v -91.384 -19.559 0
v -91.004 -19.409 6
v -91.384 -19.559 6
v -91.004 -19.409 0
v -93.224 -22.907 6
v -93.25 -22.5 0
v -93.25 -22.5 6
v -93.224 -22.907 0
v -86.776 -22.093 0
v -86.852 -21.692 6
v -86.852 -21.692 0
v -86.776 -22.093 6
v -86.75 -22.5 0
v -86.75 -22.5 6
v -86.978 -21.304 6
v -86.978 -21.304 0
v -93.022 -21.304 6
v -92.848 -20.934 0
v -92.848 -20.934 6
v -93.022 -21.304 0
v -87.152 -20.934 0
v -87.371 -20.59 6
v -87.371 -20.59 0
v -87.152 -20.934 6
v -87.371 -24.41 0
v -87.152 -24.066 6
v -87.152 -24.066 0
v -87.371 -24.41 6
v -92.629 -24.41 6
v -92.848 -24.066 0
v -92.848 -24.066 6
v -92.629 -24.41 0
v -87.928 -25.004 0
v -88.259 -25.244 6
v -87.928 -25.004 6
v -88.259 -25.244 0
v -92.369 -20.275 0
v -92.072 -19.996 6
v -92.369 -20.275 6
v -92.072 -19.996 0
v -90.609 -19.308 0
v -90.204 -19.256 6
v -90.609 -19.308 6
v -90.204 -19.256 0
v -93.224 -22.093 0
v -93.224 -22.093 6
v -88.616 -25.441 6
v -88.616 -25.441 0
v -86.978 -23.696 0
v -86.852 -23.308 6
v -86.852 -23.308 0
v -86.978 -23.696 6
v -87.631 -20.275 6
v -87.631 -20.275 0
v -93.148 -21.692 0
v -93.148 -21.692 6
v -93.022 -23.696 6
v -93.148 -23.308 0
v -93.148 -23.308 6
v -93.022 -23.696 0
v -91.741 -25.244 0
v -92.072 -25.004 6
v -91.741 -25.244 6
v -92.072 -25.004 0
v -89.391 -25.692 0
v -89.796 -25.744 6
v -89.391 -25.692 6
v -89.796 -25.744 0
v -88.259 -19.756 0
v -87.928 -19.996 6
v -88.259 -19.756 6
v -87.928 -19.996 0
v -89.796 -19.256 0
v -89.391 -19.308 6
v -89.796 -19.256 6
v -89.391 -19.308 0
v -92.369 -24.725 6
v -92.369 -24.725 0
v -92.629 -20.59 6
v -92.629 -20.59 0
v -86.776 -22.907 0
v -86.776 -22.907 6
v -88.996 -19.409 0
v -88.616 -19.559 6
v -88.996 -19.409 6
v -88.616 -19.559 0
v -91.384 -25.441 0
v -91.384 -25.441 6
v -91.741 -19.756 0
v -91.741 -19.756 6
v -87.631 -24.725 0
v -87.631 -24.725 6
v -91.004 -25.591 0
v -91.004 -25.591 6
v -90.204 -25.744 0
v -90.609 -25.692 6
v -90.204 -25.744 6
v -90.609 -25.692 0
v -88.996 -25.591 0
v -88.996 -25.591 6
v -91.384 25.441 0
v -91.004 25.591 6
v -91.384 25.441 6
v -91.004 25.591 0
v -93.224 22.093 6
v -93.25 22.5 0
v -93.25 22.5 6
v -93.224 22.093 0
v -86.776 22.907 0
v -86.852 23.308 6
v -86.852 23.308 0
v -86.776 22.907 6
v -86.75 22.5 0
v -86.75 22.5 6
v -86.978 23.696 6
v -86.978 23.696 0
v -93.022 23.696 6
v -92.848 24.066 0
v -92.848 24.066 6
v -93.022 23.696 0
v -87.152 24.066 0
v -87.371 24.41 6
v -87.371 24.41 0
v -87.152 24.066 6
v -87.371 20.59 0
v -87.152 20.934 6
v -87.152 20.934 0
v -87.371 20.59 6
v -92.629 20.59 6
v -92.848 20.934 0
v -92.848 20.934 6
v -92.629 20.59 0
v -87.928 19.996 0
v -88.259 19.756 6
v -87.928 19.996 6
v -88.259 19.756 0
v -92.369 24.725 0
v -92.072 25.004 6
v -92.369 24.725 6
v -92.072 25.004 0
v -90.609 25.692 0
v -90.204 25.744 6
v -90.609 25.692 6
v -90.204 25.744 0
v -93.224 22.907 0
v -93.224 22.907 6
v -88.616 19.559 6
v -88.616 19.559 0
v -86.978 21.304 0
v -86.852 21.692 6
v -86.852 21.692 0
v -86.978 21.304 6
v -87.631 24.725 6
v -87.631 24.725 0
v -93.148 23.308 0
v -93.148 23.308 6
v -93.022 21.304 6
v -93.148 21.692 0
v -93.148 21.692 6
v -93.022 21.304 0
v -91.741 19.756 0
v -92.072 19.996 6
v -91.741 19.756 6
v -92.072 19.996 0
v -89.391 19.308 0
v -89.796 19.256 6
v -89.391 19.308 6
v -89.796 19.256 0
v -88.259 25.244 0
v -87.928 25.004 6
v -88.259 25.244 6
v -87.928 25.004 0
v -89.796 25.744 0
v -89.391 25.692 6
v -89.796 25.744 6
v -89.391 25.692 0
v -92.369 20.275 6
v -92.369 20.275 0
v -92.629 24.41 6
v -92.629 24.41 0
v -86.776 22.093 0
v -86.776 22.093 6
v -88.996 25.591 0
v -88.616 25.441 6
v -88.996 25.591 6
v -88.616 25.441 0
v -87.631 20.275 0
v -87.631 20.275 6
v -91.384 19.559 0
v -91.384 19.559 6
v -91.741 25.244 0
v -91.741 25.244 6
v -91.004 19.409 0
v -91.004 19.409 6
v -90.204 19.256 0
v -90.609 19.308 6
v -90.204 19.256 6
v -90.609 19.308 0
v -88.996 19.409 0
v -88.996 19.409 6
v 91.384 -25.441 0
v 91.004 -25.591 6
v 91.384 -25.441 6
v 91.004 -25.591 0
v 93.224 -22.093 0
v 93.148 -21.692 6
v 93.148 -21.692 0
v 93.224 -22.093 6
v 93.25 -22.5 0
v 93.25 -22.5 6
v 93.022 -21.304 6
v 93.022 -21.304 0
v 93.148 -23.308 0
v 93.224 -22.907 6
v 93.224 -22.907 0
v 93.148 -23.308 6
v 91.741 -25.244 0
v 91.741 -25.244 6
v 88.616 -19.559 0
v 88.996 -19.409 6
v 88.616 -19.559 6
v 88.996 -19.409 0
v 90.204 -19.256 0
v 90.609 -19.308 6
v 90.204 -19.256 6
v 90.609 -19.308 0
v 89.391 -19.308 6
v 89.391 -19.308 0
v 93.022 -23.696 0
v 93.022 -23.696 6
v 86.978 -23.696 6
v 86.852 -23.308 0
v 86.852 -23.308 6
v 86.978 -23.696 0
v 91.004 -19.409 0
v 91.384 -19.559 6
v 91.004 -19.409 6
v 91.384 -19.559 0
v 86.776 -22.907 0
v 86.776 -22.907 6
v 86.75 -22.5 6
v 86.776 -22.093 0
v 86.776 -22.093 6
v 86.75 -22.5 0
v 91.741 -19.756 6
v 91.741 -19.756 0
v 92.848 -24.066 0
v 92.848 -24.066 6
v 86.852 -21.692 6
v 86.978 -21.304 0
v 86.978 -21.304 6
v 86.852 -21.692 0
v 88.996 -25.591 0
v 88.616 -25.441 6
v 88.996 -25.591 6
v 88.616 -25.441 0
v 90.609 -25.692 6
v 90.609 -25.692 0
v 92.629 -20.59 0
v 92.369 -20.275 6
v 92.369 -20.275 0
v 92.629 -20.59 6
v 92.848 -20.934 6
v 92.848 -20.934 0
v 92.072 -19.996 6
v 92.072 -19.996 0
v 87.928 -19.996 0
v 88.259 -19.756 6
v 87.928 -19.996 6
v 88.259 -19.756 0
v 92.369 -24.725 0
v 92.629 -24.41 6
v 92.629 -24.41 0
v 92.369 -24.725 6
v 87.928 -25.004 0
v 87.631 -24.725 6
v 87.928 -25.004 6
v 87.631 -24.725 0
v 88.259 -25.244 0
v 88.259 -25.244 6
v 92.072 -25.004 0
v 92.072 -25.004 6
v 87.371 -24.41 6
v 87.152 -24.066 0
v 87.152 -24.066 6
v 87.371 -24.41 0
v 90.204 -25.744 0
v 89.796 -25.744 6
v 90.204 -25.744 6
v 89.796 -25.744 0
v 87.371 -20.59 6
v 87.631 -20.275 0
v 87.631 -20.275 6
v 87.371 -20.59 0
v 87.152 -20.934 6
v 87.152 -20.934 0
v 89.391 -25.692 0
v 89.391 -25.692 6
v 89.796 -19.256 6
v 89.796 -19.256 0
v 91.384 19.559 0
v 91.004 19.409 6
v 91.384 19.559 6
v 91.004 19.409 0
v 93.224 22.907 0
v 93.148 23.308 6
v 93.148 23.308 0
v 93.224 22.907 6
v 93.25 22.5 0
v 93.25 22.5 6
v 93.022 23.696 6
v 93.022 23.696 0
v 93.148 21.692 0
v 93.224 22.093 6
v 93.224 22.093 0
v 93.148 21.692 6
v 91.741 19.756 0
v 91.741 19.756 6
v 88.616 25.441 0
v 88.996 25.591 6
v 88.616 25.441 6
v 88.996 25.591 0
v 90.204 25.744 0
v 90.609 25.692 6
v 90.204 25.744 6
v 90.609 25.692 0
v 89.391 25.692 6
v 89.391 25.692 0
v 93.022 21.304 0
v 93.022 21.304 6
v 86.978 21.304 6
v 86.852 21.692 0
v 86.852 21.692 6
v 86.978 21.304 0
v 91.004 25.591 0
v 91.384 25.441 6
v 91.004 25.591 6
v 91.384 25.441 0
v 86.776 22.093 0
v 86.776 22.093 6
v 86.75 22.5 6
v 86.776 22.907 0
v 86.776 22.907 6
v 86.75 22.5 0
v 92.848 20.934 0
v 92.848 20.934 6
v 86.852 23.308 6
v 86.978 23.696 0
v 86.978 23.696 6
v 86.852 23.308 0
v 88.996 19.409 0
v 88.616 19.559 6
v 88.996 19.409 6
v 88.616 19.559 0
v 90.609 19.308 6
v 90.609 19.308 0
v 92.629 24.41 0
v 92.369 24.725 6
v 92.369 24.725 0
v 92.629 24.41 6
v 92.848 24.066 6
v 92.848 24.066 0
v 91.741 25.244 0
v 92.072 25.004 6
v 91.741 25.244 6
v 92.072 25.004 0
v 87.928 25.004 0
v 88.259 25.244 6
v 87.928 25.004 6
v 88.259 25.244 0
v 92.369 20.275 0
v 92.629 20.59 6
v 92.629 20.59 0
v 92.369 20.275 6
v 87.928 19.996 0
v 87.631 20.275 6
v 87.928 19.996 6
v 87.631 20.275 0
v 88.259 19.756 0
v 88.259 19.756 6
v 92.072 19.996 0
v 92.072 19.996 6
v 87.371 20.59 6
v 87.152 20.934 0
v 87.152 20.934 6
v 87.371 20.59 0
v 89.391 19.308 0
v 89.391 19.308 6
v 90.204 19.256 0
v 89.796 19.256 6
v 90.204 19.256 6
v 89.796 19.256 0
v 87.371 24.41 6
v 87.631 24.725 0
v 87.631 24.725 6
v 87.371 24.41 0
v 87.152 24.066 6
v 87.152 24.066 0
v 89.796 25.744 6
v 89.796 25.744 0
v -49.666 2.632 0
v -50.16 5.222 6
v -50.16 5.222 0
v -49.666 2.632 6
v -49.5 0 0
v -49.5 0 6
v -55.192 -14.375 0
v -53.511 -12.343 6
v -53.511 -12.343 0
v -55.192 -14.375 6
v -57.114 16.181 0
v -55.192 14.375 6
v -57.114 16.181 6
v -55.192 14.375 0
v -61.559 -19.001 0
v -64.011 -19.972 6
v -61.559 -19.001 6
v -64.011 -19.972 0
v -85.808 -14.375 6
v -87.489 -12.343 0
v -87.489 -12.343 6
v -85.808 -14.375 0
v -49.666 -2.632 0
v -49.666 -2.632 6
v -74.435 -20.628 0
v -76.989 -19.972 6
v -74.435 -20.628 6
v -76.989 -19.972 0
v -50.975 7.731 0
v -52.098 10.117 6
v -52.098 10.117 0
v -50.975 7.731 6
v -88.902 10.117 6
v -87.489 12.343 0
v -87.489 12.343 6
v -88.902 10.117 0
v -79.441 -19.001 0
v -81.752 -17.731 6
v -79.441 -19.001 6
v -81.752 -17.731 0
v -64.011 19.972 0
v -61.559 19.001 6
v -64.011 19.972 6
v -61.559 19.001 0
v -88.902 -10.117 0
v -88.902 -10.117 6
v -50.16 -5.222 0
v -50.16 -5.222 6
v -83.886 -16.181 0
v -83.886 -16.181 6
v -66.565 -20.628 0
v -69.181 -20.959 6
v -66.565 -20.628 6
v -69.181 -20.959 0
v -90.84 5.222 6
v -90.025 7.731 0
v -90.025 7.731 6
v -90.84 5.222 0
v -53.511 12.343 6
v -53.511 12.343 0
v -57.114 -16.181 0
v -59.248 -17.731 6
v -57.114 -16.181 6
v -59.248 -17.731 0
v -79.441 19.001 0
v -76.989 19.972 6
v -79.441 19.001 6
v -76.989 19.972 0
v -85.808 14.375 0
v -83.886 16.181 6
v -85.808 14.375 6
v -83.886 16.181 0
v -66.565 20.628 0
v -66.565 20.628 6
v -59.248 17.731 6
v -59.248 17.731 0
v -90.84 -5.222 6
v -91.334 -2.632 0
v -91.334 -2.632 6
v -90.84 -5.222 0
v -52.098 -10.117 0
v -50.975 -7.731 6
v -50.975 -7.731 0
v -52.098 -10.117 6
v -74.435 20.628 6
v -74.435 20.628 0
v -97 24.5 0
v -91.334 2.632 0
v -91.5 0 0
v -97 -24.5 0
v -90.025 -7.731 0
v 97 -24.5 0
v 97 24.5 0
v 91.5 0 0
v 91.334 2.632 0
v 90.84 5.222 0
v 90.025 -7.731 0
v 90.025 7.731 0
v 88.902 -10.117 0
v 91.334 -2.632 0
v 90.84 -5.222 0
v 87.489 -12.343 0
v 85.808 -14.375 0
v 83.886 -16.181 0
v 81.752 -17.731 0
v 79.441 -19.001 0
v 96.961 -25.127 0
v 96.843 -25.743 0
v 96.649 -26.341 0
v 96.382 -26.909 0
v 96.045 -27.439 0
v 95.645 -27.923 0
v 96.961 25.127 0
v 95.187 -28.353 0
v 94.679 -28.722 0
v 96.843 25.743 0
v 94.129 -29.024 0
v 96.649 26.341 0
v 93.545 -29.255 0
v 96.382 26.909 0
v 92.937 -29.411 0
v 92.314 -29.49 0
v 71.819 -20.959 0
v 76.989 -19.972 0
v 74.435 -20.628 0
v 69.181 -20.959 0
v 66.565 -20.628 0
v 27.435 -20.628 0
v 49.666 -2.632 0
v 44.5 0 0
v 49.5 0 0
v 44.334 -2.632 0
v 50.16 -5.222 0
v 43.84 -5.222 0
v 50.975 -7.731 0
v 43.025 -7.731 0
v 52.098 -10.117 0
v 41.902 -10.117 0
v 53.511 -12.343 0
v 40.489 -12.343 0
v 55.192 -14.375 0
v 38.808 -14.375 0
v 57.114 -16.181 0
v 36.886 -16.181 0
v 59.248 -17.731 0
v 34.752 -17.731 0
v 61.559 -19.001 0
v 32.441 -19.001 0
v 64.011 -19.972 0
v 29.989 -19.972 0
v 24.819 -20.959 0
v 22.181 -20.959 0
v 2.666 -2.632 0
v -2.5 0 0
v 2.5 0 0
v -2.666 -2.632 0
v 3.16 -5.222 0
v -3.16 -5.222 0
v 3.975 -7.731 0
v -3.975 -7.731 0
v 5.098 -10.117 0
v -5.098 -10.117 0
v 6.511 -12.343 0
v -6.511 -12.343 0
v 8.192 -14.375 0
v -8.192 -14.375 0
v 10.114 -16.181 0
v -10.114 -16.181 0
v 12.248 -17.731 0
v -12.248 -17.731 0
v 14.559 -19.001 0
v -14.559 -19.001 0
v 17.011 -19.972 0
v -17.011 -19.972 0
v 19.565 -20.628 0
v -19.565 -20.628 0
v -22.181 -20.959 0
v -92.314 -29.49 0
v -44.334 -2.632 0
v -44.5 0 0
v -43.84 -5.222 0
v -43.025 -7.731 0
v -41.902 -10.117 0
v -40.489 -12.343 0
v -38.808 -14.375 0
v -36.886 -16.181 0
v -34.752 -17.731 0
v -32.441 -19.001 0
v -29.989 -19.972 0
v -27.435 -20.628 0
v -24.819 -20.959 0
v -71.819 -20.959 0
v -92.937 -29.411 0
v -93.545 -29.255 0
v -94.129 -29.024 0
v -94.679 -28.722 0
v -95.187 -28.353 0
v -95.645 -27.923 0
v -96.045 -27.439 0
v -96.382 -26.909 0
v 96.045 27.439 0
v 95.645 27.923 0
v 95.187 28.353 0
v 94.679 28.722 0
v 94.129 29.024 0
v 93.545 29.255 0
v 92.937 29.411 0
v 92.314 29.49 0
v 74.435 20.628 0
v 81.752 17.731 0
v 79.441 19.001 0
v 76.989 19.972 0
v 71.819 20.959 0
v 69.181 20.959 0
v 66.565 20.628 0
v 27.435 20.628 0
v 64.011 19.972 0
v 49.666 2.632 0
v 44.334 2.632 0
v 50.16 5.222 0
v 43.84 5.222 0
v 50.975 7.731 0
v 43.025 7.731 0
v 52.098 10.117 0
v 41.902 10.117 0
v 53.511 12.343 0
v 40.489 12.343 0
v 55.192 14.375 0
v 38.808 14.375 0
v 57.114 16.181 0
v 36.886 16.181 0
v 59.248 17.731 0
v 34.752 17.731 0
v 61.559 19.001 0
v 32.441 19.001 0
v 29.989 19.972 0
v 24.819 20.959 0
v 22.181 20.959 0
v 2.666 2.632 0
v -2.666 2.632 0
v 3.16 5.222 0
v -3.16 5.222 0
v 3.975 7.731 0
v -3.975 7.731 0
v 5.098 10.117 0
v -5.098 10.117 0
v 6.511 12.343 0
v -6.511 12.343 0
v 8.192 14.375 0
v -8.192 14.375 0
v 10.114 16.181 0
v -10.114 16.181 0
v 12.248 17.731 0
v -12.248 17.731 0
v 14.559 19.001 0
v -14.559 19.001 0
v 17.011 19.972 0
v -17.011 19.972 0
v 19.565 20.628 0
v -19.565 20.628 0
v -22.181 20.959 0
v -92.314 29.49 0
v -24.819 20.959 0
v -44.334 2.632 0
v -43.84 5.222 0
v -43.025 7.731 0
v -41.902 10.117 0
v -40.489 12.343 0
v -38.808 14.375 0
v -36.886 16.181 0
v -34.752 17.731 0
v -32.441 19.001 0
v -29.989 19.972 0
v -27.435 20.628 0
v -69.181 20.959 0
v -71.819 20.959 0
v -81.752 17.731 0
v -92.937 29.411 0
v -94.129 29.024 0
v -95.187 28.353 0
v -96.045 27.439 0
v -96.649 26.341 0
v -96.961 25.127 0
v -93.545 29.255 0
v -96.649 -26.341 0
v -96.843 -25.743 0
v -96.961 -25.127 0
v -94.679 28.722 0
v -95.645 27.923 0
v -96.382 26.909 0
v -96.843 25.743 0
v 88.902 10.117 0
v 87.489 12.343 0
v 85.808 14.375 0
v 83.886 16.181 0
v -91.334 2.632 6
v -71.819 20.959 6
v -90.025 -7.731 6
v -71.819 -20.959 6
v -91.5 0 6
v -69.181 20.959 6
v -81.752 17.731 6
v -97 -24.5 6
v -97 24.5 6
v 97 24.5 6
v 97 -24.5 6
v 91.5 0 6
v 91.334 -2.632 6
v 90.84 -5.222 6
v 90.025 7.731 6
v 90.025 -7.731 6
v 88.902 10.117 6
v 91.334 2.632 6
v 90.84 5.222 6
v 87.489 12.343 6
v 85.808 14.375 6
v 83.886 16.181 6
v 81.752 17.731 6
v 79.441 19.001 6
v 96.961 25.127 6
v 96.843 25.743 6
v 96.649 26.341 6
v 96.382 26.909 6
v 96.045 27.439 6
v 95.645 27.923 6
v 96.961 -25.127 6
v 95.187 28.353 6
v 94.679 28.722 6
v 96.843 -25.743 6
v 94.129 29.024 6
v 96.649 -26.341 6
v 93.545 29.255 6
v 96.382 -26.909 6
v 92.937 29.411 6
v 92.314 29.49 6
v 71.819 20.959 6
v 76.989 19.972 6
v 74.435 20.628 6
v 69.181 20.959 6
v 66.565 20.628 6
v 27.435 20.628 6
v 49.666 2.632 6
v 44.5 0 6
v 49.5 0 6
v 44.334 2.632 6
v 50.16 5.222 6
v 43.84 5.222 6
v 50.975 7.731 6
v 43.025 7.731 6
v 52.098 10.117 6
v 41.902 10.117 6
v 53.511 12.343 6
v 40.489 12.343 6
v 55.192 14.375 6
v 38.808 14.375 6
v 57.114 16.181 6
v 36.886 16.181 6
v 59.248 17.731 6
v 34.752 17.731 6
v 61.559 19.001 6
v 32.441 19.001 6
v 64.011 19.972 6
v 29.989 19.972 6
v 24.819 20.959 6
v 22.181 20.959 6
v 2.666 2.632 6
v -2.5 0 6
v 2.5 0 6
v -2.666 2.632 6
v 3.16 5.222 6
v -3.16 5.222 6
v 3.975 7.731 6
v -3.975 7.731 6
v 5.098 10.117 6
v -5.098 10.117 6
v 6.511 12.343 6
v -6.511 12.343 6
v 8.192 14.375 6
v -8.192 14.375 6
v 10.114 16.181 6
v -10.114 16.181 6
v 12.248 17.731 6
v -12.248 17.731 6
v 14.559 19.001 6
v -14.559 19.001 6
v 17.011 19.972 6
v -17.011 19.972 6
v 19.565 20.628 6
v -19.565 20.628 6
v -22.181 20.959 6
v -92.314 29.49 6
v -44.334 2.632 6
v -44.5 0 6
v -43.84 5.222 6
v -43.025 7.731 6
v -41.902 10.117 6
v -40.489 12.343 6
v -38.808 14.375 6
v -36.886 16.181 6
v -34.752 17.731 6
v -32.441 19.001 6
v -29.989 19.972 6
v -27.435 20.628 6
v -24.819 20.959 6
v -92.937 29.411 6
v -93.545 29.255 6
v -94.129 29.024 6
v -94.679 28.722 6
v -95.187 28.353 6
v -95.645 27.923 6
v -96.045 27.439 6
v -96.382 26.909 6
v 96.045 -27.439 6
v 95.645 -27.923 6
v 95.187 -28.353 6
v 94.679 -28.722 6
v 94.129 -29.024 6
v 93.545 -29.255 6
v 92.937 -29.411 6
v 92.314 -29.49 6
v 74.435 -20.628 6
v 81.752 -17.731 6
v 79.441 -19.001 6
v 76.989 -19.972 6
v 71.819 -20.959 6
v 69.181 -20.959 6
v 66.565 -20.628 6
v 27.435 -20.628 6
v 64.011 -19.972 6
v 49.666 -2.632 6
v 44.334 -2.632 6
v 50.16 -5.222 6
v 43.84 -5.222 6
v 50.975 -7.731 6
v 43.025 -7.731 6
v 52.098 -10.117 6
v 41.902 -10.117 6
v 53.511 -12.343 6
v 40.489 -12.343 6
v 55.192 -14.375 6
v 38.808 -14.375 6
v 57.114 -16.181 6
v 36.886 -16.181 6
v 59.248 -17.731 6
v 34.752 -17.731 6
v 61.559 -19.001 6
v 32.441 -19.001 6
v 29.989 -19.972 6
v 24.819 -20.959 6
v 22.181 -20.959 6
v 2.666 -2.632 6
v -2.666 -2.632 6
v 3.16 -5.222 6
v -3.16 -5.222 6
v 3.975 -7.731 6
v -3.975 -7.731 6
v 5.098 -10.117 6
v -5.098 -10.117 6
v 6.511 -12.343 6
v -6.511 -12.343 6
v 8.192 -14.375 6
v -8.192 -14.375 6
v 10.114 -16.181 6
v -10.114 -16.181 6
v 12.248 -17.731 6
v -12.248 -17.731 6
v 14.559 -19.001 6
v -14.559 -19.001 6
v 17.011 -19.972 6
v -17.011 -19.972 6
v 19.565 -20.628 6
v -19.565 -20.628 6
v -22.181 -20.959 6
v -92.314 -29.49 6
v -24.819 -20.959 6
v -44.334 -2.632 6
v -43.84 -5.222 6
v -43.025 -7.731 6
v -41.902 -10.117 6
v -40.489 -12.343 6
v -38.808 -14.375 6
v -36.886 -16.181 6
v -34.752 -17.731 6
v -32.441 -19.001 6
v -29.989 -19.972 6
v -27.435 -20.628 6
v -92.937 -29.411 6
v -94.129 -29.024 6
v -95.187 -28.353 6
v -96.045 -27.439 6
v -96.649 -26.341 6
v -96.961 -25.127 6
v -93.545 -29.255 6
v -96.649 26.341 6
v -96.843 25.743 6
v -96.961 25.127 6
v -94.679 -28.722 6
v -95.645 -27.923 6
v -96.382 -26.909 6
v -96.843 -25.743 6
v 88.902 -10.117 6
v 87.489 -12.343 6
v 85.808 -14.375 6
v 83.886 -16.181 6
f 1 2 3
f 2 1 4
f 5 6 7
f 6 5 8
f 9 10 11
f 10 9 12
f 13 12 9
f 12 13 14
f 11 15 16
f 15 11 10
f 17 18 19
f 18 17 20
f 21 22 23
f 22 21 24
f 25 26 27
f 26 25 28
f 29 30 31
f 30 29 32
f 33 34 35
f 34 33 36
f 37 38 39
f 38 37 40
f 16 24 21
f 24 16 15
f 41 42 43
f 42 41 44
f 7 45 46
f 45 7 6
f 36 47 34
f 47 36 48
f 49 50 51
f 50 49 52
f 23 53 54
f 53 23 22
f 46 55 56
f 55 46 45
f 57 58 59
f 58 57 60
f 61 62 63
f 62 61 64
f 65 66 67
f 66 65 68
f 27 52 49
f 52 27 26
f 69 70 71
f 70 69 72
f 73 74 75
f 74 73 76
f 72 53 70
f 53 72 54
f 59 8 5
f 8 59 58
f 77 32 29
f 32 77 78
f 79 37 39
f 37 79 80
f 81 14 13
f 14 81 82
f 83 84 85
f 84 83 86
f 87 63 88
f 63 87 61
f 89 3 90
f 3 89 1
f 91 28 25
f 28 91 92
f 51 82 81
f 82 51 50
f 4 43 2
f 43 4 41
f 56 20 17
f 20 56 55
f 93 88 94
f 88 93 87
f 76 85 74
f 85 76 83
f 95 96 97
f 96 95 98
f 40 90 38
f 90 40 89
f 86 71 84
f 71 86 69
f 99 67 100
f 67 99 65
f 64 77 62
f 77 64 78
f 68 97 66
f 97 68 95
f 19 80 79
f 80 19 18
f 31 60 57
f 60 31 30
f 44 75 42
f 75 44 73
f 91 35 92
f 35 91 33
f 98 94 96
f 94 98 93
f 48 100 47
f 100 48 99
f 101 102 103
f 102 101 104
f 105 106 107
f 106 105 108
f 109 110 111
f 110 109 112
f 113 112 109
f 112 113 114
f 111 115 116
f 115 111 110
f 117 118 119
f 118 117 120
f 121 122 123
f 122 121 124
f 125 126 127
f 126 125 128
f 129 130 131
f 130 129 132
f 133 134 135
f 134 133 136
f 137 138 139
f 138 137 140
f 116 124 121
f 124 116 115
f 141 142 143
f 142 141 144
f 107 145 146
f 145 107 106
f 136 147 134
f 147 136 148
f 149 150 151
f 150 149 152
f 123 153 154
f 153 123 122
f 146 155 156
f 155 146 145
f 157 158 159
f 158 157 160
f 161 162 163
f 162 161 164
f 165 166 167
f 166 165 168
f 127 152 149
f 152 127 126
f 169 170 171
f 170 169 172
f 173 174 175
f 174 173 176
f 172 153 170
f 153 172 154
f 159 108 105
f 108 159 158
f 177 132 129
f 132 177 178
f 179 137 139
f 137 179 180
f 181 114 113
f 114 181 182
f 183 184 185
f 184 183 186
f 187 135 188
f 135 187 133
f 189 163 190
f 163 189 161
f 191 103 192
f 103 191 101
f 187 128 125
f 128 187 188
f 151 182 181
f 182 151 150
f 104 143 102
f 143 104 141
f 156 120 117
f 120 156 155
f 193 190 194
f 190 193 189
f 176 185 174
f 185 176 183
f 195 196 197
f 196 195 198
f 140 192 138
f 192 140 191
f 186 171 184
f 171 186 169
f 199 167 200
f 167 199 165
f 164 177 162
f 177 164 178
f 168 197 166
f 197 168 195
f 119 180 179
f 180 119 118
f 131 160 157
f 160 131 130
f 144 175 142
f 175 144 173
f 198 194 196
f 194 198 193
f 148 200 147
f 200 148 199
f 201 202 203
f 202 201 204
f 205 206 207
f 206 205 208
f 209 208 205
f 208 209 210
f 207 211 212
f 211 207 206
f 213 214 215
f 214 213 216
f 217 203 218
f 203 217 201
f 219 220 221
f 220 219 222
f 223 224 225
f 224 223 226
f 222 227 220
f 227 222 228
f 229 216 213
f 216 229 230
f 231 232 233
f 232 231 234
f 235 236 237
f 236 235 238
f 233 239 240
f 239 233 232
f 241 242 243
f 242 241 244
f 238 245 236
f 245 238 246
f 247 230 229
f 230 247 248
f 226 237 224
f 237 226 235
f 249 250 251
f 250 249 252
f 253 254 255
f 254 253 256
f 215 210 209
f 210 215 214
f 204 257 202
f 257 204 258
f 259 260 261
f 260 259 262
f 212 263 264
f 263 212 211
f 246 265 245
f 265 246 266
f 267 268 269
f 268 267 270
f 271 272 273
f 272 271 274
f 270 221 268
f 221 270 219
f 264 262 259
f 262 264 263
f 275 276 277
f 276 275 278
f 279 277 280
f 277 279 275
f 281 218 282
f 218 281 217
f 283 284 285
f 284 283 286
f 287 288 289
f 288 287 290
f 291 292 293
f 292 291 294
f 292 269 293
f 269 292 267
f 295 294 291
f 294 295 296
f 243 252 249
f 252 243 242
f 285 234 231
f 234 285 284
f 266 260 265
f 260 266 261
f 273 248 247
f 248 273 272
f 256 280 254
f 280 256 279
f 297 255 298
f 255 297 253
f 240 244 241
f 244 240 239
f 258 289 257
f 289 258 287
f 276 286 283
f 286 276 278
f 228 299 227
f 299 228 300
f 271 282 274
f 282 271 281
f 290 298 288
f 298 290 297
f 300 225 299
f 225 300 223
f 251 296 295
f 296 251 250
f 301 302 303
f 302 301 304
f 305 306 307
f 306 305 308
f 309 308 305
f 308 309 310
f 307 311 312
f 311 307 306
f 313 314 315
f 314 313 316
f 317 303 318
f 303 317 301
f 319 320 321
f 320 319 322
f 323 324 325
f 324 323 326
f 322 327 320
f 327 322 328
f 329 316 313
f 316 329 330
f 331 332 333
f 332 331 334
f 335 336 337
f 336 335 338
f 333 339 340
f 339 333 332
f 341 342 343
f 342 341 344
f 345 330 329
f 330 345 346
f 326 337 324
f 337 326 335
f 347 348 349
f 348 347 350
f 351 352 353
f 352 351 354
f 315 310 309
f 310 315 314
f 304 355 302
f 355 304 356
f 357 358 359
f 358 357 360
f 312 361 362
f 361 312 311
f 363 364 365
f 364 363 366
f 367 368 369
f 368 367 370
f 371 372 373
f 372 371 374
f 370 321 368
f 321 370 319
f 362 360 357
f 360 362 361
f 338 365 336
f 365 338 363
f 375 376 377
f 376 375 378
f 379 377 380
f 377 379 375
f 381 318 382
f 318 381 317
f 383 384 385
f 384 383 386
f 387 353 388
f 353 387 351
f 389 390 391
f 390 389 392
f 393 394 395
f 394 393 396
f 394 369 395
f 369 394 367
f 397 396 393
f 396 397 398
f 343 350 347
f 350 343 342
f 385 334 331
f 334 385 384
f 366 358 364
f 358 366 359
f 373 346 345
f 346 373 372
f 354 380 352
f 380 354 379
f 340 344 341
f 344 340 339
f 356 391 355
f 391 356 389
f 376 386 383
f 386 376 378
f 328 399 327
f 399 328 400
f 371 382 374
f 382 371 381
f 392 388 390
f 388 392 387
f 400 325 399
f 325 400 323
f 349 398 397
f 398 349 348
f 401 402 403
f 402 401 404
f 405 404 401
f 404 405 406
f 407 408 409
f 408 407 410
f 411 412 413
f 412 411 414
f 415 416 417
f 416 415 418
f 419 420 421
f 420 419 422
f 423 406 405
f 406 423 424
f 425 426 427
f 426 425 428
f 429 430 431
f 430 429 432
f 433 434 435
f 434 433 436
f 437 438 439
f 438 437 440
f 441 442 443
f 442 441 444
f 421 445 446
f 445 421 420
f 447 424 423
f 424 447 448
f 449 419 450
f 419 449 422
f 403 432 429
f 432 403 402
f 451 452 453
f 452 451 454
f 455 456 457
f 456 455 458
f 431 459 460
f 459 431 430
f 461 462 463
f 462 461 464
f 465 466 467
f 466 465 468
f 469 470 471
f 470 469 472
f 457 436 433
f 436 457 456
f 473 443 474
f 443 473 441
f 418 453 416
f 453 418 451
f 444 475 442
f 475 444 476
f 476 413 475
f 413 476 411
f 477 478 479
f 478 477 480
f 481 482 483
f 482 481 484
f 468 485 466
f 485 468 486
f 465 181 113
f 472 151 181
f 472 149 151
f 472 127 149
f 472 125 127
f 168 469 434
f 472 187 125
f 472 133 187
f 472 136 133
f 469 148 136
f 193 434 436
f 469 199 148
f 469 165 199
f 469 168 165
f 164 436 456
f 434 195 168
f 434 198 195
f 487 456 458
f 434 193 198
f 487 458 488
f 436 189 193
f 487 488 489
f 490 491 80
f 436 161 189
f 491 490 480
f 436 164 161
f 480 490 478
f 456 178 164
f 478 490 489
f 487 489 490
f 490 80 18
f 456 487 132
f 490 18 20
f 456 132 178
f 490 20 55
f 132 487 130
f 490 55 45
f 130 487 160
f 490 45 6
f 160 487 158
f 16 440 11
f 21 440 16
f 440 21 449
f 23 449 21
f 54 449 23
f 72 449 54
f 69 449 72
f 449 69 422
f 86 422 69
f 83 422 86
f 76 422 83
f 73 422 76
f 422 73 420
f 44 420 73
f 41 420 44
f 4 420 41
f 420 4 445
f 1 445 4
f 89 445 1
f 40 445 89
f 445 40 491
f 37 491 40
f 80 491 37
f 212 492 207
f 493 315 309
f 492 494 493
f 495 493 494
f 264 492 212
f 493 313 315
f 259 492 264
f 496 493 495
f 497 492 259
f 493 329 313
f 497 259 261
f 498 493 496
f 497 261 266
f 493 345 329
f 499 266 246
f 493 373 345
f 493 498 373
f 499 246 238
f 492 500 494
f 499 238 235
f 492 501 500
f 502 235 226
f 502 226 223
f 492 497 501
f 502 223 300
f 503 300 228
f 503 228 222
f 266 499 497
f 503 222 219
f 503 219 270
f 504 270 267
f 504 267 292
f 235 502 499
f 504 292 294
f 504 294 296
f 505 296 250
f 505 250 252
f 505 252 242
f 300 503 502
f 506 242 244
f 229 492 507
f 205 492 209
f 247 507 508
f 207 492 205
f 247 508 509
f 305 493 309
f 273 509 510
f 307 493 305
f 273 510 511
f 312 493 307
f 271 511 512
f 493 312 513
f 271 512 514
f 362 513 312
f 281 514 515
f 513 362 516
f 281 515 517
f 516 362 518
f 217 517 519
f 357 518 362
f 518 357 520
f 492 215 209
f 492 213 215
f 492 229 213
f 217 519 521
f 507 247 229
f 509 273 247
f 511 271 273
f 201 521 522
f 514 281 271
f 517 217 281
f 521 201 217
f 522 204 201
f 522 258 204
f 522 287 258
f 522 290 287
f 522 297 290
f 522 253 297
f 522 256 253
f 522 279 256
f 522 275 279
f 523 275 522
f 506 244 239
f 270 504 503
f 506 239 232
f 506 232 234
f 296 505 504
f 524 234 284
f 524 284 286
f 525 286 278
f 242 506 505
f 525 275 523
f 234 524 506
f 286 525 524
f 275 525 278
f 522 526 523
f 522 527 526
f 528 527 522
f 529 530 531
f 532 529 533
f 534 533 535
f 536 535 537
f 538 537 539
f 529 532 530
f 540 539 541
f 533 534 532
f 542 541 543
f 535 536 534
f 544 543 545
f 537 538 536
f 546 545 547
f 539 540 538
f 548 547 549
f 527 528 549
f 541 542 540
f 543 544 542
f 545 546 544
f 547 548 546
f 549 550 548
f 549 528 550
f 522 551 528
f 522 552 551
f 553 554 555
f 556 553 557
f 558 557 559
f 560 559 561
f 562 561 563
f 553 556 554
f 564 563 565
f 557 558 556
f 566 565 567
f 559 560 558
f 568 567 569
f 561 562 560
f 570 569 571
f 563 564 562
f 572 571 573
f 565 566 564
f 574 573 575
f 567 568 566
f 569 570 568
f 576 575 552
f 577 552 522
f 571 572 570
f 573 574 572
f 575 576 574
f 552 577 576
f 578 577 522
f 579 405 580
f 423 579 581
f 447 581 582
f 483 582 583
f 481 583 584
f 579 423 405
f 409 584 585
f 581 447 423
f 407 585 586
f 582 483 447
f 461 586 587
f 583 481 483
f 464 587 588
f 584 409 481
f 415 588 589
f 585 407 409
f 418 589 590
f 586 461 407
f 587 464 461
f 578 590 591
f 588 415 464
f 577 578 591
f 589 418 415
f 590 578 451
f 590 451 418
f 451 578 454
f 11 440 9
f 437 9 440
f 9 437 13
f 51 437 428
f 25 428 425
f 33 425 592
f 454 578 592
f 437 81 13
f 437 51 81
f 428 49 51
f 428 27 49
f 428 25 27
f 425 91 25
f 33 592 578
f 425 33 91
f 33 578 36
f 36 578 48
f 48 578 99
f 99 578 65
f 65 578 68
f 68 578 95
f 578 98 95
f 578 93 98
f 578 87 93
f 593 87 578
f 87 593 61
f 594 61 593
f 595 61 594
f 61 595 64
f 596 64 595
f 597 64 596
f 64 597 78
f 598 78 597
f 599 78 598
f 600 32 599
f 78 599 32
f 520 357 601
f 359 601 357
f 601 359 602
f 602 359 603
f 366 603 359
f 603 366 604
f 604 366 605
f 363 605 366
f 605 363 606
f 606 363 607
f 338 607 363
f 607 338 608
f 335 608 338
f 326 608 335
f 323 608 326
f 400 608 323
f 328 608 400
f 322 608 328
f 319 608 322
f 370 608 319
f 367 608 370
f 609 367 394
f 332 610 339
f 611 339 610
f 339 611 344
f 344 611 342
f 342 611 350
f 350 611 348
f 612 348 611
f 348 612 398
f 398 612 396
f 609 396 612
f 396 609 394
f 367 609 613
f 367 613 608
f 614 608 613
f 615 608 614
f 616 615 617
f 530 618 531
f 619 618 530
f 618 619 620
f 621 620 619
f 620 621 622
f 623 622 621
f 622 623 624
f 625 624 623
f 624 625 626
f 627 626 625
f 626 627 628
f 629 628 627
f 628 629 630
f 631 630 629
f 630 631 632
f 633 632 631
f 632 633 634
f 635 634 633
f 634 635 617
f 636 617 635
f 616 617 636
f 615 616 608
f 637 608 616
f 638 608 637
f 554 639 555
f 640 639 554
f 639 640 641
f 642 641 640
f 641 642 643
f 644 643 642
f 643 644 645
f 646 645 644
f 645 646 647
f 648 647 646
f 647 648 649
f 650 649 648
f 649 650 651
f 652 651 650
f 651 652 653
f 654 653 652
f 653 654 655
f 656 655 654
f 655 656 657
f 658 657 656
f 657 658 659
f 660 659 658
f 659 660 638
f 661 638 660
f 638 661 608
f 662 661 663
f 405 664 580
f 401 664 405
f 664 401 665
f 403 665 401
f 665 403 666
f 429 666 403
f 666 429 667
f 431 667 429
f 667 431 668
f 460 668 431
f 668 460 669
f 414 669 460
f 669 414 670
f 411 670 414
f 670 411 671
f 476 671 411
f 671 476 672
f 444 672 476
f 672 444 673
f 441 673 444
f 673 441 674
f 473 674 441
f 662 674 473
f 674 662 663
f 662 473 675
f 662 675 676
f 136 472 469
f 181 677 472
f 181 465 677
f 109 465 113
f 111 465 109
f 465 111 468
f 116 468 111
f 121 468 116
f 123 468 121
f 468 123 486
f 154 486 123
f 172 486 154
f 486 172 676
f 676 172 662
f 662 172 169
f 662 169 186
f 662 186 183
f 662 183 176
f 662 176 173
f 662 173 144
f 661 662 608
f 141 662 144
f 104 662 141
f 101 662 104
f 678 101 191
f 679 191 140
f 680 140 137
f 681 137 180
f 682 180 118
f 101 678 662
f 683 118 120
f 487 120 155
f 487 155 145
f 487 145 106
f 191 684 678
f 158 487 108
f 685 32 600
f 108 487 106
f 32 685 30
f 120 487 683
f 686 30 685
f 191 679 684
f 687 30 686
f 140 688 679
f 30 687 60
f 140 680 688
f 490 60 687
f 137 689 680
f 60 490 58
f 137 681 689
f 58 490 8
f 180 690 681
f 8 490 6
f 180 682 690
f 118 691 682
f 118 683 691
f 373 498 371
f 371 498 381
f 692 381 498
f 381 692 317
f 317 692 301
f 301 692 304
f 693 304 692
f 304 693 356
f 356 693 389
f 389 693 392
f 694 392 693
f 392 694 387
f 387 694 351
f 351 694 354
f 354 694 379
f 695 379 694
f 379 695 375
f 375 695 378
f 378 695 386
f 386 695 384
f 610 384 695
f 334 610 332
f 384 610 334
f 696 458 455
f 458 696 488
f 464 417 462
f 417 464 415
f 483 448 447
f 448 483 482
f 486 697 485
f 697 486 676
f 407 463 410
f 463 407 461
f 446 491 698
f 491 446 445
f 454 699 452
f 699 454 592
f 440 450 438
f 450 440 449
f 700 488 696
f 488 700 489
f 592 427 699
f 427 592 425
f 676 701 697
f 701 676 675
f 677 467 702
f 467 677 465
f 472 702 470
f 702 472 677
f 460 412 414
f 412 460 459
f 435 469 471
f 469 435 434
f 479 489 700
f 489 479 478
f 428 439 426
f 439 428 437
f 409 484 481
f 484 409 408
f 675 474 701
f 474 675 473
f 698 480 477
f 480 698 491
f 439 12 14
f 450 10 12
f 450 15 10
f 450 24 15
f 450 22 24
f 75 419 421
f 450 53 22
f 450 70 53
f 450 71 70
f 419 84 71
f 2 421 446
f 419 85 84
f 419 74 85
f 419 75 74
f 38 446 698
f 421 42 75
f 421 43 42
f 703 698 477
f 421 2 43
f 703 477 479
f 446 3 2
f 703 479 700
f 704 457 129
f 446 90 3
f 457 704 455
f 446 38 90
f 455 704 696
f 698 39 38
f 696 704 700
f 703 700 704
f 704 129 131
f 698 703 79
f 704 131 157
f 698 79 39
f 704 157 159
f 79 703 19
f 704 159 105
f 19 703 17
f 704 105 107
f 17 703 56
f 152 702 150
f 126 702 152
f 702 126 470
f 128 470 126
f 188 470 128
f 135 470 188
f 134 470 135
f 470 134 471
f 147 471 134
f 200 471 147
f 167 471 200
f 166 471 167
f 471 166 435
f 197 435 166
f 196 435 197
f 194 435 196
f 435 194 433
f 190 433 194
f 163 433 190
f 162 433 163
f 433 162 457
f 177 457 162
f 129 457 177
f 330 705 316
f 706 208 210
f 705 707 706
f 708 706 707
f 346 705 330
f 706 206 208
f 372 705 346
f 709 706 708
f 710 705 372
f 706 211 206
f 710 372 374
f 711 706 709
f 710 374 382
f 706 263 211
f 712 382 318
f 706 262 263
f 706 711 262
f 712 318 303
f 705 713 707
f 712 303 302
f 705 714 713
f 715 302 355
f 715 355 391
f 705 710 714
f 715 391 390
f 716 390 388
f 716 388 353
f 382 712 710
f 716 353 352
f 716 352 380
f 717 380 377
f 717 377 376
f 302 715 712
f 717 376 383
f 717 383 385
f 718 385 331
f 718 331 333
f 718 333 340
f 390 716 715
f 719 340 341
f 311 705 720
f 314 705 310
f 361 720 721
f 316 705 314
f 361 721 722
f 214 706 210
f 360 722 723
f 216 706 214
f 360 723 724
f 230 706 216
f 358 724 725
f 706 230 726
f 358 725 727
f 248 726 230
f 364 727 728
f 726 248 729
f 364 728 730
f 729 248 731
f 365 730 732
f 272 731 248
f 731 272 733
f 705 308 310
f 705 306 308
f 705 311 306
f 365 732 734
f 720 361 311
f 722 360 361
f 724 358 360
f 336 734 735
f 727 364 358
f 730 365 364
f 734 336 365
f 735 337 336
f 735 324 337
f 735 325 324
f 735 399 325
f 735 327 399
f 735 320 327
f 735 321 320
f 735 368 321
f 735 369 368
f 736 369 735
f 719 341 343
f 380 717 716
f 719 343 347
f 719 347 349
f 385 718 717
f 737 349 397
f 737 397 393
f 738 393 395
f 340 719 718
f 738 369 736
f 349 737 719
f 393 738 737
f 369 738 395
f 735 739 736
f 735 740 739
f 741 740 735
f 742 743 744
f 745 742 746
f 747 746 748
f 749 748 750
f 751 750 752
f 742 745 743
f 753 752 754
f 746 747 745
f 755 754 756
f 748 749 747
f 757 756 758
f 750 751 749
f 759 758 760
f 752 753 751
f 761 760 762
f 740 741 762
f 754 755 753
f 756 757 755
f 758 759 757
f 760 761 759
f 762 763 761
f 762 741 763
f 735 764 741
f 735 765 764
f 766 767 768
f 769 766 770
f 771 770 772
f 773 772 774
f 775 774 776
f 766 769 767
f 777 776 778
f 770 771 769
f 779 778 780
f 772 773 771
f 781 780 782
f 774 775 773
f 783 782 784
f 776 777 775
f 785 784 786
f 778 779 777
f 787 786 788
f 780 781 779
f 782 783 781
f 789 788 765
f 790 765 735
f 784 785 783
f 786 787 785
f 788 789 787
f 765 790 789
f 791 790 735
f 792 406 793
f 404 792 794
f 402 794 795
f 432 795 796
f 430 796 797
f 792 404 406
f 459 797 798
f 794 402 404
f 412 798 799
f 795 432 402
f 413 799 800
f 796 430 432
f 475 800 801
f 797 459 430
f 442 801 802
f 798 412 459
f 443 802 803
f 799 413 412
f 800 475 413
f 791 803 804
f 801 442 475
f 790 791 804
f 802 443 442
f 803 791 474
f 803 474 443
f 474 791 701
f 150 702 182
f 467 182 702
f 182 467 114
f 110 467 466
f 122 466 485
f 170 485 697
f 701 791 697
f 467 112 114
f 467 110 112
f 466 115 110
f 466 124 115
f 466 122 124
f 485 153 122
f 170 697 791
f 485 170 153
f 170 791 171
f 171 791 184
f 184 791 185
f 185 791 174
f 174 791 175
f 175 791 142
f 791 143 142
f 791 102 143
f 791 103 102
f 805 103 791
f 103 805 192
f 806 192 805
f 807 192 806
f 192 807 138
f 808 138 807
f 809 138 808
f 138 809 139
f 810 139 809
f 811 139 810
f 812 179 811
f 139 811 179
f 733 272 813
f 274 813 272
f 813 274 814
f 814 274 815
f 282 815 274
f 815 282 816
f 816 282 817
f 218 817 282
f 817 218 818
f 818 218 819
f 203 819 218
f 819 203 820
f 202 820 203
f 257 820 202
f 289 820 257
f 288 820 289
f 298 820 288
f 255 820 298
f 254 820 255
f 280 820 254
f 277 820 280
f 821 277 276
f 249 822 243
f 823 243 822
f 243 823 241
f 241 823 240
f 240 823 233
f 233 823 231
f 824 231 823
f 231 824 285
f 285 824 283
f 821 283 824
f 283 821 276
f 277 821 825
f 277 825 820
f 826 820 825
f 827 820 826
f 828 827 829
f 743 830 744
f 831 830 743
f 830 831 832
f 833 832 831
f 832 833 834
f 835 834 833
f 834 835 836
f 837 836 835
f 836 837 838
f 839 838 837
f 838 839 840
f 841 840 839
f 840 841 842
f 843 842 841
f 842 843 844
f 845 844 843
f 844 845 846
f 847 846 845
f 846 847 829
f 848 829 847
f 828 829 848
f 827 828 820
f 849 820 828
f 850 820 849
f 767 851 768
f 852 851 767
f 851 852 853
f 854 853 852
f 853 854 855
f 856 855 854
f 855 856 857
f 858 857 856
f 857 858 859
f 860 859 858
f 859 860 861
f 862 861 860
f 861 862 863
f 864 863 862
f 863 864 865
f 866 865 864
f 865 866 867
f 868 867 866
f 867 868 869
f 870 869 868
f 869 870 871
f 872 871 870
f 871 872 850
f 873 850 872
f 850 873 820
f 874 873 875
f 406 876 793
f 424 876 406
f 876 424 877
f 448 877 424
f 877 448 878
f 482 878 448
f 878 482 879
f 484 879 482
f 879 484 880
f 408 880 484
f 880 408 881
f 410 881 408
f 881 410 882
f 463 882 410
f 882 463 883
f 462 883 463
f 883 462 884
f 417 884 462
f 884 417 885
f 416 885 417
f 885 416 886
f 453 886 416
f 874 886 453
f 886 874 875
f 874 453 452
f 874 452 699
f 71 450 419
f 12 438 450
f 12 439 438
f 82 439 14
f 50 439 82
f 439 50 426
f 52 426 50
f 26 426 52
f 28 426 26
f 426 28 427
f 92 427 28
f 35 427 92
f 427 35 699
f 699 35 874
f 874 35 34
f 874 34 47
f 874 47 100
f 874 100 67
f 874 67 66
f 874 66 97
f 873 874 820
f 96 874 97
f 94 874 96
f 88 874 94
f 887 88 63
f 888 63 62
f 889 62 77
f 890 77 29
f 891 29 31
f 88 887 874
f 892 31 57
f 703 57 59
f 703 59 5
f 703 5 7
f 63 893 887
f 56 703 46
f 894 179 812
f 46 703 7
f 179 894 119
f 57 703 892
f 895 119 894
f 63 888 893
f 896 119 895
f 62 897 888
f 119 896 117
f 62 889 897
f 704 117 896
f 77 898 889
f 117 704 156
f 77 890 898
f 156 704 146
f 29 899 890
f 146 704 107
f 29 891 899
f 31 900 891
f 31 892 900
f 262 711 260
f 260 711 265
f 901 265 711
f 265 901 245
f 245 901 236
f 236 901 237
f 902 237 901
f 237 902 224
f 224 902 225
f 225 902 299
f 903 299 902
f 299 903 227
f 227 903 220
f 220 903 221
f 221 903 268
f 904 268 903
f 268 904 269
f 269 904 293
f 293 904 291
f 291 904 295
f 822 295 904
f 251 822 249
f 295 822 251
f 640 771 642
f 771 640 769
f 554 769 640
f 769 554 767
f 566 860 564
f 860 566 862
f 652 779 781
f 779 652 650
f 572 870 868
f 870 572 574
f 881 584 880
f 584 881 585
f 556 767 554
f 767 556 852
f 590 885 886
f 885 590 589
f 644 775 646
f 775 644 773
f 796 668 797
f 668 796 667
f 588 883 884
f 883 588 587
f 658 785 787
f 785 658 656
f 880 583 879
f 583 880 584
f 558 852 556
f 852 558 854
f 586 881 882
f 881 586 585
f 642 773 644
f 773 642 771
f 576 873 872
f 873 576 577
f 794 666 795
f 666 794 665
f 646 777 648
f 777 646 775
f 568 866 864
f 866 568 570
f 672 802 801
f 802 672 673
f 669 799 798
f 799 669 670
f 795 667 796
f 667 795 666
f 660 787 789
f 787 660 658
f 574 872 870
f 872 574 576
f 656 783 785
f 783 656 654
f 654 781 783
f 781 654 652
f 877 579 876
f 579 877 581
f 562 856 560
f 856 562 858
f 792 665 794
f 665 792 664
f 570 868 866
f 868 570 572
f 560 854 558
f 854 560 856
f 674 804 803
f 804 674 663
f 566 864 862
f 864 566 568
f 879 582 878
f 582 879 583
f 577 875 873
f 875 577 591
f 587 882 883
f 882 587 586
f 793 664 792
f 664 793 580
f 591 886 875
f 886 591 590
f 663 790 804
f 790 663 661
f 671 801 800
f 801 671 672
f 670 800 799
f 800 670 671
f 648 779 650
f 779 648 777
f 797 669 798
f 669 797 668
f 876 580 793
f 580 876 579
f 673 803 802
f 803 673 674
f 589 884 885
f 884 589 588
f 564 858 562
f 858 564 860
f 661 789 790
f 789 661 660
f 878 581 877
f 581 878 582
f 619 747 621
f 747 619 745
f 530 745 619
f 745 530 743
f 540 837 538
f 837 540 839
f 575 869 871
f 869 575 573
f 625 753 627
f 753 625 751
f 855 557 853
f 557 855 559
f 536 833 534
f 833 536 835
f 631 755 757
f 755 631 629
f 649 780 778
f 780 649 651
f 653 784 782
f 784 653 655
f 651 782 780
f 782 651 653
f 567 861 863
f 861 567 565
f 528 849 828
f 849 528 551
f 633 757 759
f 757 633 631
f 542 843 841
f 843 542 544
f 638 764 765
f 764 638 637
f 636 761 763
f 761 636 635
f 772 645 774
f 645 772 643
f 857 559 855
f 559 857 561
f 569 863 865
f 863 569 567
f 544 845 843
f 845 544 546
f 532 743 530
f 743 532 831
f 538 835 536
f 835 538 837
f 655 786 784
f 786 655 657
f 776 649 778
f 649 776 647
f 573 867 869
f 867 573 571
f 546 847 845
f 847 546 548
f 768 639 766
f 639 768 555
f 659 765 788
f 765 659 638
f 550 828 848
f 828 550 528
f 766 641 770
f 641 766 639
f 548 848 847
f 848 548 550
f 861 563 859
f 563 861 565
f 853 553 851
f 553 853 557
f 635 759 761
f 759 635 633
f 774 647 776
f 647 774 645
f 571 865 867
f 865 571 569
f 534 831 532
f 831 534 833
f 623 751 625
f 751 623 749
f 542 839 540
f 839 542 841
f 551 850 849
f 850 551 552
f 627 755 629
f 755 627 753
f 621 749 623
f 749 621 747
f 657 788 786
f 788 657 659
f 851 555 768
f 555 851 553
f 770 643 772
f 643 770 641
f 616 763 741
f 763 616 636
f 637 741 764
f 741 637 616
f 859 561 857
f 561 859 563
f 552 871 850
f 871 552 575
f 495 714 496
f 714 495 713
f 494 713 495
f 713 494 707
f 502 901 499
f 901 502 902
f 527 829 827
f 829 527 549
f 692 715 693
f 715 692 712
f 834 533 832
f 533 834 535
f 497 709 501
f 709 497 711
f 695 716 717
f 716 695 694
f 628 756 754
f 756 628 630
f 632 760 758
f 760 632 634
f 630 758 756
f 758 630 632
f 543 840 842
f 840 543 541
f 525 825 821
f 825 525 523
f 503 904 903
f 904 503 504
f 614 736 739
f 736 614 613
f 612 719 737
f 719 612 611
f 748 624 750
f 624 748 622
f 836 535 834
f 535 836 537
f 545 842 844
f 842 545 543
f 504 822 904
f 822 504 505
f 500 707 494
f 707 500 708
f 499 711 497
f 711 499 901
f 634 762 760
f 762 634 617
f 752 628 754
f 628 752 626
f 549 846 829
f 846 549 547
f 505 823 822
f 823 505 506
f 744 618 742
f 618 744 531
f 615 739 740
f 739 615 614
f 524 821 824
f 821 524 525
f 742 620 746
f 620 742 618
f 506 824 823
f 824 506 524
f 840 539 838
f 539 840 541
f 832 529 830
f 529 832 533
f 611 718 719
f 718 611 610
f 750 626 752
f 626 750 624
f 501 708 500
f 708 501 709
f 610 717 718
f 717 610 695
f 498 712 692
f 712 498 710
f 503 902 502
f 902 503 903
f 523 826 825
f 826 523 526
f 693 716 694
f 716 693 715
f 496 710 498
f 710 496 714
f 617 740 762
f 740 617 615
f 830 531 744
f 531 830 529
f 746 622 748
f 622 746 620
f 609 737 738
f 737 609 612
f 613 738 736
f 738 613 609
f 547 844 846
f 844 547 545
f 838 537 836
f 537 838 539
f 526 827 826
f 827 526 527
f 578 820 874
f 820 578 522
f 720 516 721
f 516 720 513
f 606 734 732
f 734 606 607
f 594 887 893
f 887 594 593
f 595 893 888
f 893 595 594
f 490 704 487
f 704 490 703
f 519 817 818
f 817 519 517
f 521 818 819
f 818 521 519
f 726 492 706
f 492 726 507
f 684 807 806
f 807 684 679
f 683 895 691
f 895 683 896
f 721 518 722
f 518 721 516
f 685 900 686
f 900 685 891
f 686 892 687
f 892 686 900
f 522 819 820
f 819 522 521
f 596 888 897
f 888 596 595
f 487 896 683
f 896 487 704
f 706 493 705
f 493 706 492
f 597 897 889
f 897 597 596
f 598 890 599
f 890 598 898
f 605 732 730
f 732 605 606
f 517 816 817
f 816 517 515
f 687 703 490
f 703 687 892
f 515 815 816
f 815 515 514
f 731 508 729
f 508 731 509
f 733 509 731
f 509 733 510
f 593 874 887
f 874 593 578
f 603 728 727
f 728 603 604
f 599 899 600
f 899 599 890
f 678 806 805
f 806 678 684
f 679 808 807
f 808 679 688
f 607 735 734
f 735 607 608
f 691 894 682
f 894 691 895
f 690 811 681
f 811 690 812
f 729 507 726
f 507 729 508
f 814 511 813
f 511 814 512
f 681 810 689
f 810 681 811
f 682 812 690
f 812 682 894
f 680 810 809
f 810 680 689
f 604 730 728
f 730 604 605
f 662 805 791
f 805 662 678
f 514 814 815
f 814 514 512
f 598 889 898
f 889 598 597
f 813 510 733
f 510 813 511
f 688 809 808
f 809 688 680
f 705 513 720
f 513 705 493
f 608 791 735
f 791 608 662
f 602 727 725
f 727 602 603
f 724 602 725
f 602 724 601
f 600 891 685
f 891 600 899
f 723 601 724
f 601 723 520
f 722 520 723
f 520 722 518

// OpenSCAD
$fn = 50;

difference() {
	union() {
		hull() {
			translate(v = [-92.0, 24.5, 0]) {
				cylinder(h = 6, r = 5);
			}
			translate(v = [92.0, 24.5, 0]) {
				cylinder(h = 6, r = 5);
			}
			translate(v = [-92.0, -24.5, 0]) {
				cylinder(h = 6, r = 5);
			}
			translate(v = [92.0, -24.5, 0]) {
				cylinder(h = 6, r = 5);
			}
		}
	}
	union() {
		translate(v = [-90.0, -22.5, -100.0]) {
			cylinder(h = 200, r = 3.25);
		}
		translate(v = [-90.0, 22.5, -100.0]) {
			cylinder(h = 200, r = 3.25);
		}
		translate(v = [90.0, -22.5, -100.0]) {
			cylinder(h = 200, r = 3.25);
		}
		translate(v = [90.0, 22.5, -100.0]) {
			cylinder(h = 200, r = 3.25);
		}
		translate(v = [-90.0, -22.5, -100.0]) {
			cylinder(h = 200, r = 1.8);
		}
		translate(v = [-90.0, 22.5, -100.0]) {
			cylinder(h = 200, r = 1.8);
		}
		translate(v = [90.0, -22.5, -100.0]) {
			cylinder(h = 200, r = 1.8);
		}
		translate(v = [90.0, 22.5, -100.0]) {
			cylinder(h = 200, r = 1.8);
		}
		translate(v = [-70.5, 0, 0.0]) {
			cylinder(h = 6, r = 21.0);
		}
		translate(v = [-23.5, 0, 0.0]) {
			cylinder(h = 6, r = 21.0);
		}
		translate(v = [23.5, 0, 0.0]) {
			cylinder(h = 6, r = 21.0);
		}
		translate(v = [70.5, 0, 0.0]) {
			cylinder(h = 6, r = 21.0);
		}
	}
}
